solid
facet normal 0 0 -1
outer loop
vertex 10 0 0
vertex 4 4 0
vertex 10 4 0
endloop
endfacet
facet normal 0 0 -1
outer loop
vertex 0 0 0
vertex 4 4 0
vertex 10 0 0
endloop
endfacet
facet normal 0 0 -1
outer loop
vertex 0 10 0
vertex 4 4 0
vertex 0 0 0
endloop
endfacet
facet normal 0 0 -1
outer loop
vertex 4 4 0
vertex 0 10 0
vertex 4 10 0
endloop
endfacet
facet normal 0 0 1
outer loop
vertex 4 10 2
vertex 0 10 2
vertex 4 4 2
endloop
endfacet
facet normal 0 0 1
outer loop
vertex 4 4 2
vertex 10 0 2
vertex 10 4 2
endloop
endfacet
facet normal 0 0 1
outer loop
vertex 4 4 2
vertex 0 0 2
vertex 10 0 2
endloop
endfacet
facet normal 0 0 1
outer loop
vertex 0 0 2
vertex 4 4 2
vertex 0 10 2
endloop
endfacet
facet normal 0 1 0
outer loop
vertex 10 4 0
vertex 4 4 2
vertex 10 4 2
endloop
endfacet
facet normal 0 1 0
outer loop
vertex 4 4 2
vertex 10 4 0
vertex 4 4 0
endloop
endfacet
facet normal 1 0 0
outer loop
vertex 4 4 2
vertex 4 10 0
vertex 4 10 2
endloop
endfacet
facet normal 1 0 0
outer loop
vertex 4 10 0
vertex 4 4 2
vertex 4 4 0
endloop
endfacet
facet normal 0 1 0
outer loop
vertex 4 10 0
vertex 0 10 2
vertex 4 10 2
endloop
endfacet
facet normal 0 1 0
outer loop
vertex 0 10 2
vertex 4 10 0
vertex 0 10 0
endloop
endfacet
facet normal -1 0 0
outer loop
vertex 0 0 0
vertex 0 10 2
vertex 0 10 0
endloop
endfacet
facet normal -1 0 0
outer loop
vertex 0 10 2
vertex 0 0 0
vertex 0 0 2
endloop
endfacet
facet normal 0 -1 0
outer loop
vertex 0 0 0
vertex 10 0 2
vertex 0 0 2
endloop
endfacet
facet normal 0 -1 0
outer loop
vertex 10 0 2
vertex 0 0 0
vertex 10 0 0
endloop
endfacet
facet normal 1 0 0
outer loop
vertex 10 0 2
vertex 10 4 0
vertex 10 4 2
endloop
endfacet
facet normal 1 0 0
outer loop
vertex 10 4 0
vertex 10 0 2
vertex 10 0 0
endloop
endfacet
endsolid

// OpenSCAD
// Prisme en L donne face par face : polyhedron() est ecrit tel quel, sans CGAL,
// donc avec deux faces CONCAVES a six sommets. Aire du profil 64, volume 128.
polyhedron(
    points = [[10, 4, 0], [4, 4, 0], [4, 10, 0], [0, 10, 0], [0, 0, 0], [10, 0, 0],
              [10, 4, 2], [4, 4, 2], [4, 10, 2], [0, 10, 2], [0, 0, 2], [10, 0, 2]],
    faces  = [[0, 1, 2, 3, 4, 5], [11, 10, 9, 8, 7, 6],
              [0, 6, 7, 1], [1, 7, 8, 2], [2, 8, 9, 3], [3, 9, 10, 4], [4, 10, 11, 5], [5, 11, 6, 0]]);
